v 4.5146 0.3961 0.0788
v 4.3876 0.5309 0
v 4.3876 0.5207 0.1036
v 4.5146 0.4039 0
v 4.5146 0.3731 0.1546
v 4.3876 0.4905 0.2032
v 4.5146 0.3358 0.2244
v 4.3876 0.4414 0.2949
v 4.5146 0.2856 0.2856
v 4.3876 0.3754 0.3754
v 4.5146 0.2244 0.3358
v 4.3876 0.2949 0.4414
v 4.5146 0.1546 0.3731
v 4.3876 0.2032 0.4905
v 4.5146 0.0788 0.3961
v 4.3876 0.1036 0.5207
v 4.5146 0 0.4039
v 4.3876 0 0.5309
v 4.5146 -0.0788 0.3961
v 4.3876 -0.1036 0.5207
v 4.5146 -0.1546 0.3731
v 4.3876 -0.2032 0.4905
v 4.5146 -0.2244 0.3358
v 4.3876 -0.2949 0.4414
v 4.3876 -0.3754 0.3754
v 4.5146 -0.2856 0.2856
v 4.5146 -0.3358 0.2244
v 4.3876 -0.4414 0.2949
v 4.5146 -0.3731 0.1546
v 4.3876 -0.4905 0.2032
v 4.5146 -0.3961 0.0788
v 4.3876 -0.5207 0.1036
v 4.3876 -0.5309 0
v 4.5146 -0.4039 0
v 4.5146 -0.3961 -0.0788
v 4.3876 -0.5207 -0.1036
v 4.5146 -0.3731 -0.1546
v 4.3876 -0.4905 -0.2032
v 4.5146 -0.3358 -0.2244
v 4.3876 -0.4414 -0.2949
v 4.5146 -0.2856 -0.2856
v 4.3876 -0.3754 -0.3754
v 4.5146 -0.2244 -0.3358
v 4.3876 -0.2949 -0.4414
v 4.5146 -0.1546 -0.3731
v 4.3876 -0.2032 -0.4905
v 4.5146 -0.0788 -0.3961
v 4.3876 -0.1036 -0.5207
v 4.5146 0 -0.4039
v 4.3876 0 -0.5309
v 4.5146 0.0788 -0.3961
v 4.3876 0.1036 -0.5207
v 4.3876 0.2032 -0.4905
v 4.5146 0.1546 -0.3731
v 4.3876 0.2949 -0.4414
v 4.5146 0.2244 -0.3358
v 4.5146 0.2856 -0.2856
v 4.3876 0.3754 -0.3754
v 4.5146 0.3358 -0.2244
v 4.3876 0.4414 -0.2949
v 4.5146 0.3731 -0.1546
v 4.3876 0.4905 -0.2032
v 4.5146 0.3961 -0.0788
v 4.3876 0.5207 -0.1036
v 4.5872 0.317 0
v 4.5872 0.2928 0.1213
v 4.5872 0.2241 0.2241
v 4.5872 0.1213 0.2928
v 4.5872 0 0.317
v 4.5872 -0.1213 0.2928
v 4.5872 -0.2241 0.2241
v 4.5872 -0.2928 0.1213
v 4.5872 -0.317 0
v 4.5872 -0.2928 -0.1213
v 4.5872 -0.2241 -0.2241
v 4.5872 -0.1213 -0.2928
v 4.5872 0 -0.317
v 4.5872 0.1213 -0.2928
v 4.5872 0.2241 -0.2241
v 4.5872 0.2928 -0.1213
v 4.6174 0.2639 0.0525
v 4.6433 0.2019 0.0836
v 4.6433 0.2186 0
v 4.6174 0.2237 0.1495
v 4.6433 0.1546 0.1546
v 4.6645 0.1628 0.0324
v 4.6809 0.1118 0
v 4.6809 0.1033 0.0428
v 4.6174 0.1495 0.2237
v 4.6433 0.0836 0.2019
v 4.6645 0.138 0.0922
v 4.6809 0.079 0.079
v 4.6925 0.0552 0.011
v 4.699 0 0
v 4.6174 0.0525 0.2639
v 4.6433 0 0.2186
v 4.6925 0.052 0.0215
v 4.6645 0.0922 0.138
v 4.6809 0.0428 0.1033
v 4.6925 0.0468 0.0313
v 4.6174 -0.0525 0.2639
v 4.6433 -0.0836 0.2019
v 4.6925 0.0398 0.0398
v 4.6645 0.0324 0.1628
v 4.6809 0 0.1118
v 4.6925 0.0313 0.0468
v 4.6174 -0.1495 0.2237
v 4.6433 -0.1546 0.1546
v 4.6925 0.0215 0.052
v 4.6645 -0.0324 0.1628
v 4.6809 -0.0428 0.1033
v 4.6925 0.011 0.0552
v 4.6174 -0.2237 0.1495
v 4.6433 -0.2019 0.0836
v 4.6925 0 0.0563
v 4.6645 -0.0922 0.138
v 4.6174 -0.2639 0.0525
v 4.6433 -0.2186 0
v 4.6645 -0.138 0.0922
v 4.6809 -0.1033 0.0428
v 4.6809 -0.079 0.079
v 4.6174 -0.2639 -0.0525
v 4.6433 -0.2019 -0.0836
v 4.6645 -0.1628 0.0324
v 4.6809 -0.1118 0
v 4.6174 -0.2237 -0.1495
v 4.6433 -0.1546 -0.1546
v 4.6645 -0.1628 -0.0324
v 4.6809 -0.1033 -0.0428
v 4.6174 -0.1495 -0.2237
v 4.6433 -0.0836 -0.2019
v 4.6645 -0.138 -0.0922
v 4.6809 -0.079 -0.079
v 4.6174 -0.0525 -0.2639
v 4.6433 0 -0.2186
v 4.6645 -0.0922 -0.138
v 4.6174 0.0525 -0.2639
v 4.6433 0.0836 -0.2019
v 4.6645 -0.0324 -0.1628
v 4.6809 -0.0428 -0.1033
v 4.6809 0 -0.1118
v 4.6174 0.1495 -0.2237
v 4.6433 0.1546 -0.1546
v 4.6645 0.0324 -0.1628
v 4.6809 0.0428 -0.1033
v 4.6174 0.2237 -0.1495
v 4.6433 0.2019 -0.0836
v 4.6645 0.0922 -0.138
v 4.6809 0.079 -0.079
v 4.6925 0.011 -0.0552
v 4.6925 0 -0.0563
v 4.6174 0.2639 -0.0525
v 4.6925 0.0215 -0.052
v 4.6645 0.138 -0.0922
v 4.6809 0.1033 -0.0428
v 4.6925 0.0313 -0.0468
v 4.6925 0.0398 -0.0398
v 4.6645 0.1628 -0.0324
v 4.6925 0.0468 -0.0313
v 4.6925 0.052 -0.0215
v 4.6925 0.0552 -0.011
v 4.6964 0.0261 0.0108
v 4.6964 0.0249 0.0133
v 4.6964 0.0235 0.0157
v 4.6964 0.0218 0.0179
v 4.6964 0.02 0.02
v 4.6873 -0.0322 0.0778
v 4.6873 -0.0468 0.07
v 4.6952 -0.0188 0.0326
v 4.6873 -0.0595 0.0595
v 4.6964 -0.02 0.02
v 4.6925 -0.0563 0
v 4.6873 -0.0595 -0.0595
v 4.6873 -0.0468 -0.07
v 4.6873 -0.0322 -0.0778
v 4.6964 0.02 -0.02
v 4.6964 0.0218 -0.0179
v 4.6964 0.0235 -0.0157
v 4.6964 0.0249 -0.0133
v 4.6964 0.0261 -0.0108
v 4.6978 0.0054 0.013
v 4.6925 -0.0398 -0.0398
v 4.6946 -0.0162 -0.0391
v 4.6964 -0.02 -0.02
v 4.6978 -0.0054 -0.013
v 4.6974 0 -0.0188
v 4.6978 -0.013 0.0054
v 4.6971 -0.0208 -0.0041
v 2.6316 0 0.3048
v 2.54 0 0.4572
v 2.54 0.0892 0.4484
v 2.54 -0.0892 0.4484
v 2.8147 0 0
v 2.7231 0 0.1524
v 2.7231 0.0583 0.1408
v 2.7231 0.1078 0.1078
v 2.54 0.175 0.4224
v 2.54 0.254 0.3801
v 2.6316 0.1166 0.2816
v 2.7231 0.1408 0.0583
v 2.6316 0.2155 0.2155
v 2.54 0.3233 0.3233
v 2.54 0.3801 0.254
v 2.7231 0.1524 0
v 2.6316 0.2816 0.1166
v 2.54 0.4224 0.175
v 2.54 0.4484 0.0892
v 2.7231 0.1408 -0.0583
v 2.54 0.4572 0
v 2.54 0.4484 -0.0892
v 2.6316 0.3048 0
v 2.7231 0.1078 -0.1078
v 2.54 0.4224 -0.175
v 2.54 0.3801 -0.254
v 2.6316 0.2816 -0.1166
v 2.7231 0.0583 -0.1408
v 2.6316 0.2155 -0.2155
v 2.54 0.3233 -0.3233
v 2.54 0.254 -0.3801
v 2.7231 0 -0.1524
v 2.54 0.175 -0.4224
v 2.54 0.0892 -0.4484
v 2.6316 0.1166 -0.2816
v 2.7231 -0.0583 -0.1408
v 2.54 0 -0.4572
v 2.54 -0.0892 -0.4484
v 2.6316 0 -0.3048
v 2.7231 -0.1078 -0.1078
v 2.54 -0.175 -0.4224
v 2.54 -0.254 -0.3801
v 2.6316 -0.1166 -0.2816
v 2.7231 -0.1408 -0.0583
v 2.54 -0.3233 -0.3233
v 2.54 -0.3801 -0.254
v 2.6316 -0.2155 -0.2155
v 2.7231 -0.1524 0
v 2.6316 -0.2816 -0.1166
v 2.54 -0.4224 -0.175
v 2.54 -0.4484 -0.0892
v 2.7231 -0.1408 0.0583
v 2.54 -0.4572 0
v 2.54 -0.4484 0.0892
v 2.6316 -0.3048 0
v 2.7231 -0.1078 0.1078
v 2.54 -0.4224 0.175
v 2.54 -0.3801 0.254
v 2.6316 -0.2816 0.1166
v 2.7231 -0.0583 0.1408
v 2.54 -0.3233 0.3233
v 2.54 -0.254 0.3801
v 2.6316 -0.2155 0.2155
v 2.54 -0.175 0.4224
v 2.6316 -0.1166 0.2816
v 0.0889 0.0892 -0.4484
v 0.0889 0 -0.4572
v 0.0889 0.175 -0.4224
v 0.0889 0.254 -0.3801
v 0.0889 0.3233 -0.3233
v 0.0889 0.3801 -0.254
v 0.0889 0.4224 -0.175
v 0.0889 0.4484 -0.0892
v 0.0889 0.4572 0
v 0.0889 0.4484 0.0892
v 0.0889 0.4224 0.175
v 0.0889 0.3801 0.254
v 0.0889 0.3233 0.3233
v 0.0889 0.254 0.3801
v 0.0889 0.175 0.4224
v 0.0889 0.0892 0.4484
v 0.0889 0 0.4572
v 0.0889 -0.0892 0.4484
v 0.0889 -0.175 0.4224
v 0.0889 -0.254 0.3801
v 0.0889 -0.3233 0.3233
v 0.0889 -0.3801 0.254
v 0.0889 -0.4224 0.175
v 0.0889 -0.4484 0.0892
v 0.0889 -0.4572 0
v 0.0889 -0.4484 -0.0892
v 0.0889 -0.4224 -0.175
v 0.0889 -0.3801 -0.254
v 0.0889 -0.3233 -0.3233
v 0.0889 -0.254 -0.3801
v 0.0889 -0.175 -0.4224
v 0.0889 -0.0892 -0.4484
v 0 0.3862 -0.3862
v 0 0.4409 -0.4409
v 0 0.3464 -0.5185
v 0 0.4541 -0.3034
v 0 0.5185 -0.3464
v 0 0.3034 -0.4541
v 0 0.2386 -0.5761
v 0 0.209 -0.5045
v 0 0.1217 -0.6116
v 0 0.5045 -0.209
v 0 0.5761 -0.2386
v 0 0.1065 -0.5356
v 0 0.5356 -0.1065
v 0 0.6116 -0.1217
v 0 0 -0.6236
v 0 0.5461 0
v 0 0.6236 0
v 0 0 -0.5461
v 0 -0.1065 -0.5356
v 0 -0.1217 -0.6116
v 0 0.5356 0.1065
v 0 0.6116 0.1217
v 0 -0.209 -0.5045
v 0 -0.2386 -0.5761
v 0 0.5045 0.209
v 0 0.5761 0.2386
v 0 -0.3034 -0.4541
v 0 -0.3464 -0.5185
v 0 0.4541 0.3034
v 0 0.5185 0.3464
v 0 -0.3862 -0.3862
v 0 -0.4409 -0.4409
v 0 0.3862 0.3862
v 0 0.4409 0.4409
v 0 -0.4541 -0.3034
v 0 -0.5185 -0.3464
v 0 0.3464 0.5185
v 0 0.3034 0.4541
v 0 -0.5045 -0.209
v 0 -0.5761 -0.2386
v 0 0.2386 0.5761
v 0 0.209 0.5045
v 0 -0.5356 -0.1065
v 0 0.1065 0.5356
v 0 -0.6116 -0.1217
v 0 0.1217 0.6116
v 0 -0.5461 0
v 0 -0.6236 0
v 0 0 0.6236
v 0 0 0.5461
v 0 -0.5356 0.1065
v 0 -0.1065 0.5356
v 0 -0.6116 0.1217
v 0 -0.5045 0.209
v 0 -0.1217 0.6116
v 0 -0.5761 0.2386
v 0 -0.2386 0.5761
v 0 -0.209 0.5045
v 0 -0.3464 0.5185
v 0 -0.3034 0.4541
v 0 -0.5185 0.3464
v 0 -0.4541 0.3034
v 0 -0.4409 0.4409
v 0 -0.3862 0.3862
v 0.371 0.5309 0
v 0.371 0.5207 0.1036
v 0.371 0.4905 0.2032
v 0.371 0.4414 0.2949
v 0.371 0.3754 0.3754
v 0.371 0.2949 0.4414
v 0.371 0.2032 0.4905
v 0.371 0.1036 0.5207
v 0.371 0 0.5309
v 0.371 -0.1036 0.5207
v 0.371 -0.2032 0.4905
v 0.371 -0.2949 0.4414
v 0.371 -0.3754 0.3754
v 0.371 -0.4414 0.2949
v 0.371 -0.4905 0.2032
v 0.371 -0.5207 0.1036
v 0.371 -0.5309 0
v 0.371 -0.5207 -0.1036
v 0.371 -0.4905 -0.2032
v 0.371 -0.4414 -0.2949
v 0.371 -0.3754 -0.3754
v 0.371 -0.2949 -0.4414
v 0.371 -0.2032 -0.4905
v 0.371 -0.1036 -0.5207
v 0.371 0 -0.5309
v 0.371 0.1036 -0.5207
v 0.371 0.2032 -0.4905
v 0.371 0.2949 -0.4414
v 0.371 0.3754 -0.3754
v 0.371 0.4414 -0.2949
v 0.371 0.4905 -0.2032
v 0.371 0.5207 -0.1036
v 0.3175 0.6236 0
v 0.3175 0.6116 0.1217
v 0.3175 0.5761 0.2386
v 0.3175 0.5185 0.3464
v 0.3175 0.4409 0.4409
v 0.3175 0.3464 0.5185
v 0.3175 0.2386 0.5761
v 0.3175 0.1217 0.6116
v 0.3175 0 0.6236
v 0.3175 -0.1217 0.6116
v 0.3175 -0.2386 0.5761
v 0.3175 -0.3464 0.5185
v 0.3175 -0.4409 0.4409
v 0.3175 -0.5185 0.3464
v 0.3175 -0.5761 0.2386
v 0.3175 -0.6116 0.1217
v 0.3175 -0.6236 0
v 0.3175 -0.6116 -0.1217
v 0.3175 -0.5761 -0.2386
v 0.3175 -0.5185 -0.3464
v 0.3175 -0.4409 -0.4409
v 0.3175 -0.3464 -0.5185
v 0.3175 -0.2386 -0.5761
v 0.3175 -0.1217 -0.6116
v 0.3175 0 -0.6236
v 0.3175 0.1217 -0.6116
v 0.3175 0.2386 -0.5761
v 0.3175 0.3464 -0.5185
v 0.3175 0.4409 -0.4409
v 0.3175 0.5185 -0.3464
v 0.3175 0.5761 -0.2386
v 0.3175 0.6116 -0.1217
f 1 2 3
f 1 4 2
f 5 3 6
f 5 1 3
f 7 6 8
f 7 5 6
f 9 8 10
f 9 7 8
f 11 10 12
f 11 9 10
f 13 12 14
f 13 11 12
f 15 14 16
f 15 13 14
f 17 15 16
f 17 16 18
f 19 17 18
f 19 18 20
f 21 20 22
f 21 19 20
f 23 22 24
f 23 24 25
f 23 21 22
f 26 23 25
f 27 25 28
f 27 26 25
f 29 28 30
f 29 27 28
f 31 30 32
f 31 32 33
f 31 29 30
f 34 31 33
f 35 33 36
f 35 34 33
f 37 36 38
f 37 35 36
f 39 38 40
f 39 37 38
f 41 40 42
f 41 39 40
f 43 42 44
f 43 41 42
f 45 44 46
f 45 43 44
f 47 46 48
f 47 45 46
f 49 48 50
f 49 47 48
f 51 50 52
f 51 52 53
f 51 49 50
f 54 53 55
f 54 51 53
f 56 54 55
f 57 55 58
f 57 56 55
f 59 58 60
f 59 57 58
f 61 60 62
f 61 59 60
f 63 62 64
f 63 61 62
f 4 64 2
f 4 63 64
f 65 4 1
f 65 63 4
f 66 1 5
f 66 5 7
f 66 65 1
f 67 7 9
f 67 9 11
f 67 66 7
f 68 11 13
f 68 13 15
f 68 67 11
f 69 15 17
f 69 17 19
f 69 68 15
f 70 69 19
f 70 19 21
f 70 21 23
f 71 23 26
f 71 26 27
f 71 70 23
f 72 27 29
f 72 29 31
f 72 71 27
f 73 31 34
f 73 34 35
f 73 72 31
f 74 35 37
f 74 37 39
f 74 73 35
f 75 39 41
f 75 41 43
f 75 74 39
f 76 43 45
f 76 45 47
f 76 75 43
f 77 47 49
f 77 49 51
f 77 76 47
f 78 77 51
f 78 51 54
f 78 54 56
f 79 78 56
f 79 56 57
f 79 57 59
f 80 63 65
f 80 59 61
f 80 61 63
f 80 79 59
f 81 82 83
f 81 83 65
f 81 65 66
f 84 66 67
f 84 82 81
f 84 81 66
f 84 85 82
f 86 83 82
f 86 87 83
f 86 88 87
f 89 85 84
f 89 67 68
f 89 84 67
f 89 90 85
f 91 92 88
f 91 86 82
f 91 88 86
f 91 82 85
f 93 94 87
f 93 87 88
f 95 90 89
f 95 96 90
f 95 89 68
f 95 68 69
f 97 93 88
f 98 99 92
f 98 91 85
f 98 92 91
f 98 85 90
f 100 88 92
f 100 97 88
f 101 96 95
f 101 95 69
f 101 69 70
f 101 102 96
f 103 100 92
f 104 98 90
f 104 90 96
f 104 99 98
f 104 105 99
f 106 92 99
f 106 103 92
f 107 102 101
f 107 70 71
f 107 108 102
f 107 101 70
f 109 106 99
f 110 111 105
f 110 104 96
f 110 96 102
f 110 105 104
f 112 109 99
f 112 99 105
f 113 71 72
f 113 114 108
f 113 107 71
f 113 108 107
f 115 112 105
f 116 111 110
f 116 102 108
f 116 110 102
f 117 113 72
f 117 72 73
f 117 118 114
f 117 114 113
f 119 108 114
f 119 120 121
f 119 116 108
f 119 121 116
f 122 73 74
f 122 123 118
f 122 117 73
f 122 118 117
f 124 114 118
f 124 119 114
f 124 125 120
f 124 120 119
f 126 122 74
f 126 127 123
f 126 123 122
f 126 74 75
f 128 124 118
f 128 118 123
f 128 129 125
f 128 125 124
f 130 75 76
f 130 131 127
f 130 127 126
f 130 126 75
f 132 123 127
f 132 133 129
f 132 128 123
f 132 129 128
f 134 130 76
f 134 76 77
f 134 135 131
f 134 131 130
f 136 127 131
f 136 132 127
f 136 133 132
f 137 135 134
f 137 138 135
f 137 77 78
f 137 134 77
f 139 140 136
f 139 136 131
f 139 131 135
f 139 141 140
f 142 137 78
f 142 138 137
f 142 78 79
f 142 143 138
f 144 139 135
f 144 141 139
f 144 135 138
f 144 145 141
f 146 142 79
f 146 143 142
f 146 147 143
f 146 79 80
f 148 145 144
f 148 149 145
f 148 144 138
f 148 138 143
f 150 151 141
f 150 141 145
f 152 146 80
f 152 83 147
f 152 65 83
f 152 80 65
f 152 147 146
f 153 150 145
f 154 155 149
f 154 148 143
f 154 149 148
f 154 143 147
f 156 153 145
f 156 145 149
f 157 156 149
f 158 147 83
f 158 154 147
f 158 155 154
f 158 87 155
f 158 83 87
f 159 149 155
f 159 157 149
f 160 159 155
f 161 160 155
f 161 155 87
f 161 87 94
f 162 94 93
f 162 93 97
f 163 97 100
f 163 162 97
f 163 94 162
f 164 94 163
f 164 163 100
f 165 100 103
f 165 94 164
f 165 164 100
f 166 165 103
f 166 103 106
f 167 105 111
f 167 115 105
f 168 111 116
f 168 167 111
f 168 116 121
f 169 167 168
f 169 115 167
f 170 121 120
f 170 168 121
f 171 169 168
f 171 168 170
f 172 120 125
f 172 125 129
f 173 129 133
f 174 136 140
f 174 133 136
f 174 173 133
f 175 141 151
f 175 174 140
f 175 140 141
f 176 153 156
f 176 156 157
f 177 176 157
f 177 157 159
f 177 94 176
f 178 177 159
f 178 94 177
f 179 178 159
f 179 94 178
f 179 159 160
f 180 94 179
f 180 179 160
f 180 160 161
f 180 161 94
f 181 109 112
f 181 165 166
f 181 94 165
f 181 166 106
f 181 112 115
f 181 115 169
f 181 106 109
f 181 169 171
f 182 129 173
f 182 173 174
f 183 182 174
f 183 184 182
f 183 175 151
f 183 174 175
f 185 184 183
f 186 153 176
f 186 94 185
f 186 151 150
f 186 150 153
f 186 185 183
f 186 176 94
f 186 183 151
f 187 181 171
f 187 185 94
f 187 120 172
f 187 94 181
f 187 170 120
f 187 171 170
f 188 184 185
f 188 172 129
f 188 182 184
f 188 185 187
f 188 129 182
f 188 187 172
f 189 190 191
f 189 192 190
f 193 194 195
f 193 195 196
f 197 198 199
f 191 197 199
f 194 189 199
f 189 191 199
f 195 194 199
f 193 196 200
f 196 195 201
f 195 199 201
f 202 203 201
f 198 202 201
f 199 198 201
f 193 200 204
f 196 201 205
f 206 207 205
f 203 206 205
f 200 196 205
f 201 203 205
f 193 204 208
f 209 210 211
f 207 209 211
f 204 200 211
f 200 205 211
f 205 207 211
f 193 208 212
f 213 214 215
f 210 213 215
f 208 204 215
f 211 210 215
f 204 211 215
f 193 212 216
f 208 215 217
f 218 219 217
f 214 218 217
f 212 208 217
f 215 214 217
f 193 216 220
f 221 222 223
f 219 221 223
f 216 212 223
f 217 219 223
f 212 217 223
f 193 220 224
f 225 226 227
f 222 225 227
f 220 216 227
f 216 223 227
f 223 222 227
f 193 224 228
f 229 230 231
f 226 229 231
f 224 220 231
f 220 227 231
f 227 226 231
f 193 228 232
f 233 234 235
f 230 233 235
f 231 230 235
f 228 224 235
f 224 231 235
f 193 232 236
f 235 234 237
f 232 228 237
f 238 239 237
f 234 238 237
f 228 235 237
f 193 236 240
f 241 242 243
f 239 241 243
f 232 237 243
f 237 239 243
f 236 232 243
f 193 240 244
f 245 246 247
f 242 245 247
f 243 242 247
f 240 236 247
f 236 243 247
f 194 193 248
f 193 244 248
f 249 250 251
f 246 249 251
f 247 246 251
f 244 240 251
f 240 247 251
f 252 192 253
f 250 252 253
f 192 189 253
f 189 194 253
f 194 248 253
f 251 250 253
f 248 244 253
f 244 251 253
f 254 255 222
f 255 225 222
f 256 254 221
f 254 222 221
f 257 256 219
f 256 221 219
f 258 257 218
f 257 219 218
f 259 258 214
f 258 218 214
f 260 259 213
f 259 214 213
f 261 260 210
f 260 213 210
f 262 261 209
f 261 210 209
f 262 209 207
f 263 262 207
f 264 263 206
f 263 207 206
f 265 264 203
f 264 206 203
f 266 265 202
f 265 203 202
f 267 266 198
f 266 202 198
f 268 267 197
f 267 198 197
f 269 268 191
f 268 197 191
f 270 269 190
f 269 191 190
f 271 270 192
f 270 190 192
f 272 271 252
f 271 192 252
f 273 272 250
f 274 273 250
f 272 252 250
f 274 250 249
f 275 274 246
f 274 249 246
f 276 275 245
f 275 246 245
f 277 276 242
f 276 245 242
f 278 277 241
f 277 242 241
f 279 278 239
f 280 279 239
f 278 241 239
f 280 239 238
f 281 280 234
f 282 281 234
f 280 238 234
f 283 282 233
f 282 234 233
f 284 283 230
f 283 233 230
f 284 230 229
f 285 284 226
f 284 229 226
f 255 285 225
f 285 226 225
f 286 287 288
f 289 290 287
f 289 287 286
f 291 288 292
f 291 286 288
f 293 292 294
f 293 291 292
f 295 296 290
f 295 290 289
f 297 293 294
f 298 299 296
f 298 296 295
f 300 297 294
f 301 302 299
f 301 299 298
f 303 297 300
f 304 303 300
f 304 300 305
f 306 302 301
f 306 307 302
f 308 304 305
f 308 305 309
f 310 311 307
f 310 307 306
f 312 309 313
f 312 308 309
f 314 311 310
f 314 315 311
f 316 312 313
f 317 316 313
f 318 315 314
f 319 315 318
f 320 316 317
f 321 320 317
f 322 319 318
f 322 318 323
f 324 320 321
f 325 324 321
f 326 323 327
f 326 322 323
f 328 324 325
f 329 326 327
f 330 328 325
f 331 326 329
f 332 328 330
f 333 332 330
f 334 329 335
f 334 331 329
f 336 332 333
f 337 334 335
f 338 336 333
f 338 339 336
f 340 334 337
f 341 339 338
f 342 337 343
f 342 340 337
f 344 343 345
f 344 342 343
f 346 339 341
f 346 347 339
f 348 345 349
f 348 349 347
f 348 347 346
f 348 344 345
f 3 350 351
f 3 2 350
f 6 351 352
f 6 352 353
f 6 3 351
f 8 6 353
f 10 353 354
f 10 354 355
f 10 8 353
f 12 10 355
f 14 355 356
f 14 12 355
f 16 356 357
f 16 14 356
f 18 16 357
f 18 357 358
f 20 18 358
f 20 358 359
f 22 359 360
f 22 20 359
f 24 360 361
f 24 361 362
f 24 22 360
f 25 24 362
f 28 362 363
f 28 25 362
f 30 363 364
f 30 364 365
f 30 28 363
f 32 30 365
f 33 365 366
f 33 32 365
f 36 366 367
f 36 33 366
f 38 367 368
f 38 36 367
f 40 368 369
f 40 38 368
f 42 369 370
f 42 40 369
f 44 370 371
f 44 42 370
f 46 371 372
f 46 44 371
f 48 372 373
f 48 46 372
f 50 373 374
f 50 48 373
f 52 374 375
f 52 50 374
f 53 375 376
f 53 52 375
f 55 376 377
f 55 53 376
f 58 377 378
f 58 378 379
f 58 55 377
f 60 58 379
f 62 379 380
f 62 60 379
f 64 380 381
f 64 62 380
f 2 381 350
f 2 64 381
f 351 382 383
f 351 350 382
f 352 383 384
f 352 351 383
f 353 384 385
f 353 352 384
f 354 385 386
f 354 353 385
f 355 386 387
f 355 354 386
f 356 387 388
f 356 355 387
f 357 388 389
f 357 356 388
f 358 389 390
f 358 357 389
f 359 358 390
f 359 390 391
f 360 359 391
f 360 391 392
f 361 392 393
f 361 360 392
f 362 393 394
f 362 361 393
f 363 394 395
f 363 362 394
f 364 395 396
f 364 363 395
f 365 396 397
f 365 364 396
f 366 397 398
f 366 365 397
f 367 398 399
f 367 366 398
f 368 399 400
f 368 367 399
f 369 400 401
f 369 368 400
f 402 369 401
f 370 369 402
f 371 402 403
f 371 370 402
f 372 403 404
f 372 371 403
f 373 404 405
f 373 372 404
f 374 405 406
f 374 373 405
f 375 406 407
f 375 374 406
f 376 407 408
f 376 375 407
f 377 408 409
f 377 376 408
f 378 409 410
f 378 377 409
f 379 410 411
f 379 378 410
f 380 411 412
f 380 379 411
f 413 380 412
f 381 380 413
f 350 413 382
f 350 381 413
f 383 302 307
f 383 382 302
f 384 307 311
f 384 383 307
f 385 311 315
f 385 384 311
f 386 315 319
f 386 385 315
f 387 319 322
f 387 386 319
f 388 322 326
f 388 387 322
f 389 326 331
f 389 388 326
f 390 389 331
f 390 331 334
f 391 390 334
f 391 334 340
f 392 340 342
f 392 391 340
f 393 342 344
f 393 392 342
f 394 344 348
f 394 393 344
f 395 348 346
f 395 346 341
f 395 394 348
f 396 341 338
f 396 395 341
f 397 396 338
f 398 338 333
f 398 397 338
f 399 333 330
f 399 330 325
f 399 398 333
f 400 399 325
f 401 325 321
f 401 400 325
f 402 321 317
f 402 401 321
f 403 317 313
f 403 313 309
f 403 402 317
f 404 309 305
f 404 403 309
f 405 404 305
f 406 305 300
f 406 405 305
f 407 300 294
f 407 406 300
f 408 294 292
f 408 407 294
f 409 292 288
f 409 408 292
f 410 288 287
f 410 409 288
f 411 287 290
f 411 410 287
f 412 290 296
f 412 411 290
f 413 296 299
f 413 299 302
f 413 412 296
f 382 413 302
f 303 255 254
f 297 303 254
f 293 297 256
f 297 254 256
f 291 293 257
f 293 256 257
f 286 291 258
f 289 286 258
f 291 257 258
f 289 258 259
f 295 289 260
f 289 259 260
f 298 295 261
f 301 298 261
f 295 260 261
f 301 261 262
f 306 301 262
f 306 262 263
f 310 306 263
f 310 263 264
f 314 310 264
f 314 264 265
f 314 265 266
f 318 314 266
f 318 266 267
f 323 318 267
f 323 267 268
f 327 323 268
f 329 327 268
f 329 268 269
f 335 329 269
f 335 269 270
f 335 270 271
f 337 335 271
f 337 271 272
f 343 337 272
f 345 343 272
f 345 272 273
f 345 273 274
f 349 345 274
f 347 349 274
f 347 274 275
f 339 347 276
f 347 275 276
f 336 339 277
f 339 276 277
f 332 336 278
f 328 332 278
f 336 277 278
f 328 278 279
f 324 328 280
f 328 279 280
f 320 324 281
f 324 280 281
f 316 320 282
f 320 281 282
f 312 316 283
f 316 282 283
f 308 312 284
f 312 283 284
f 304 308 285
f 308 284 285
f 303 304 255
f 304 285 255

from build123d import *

# Parameters (mm, degrees)
HOLE1_D           = 0.9144
HOLE1_DEPTH       = 2.54
HOLE1_CSINK_D     = 1.0922
HOLE1_CSINK_ANGLE = 90
HOLE1_TIP         = 0.274713475


with BuildPart() as part:
    # Sketch1 → RevolutionAngle1 (revolve)
    with BuildSketch(Plane.XY):
        with BuildLine():
            Line((0, 0), (0, 0.62357))
            Line((0, 0.62357), (0.3175, 0.62357))
            Line((0.3175, 0.62357), (0.371026143, 0.53086))
            Line((0.371026143, 0.53086), (4.387620176, 0.53086))
            Line((4.387620176, 0.53086), (4.514620176, 0.40386))
            ThreePointArc((4.514620176, 0.40386), (4.643254413, 0.218568435), (4.699, 0))
            Line((4.699, 0), (0, 0))
        make_face()
    revolve(axis=Axis((0, 0, 0), (1, 0, 0)))

    # Hole1
    with Locations(Plane.ZY):
        with Locations((0, 0)):
            CounterSinkHole(HOLE1_D / 2, HOLE1_CSINK_D / 2, depth=HOLE1_DEPTH, counter_sink_angle=HOLE1_CSINK_ANGLE)
            with Locations((0, 0, -(HOLE1_DEPTH + HOLE1_TIP / 2))):  # 118° drill point
                Cone(0, HOLE1_D / 2, HOLE1_TIP, mode=Mode.SUBTRACT)


solid = part.part
